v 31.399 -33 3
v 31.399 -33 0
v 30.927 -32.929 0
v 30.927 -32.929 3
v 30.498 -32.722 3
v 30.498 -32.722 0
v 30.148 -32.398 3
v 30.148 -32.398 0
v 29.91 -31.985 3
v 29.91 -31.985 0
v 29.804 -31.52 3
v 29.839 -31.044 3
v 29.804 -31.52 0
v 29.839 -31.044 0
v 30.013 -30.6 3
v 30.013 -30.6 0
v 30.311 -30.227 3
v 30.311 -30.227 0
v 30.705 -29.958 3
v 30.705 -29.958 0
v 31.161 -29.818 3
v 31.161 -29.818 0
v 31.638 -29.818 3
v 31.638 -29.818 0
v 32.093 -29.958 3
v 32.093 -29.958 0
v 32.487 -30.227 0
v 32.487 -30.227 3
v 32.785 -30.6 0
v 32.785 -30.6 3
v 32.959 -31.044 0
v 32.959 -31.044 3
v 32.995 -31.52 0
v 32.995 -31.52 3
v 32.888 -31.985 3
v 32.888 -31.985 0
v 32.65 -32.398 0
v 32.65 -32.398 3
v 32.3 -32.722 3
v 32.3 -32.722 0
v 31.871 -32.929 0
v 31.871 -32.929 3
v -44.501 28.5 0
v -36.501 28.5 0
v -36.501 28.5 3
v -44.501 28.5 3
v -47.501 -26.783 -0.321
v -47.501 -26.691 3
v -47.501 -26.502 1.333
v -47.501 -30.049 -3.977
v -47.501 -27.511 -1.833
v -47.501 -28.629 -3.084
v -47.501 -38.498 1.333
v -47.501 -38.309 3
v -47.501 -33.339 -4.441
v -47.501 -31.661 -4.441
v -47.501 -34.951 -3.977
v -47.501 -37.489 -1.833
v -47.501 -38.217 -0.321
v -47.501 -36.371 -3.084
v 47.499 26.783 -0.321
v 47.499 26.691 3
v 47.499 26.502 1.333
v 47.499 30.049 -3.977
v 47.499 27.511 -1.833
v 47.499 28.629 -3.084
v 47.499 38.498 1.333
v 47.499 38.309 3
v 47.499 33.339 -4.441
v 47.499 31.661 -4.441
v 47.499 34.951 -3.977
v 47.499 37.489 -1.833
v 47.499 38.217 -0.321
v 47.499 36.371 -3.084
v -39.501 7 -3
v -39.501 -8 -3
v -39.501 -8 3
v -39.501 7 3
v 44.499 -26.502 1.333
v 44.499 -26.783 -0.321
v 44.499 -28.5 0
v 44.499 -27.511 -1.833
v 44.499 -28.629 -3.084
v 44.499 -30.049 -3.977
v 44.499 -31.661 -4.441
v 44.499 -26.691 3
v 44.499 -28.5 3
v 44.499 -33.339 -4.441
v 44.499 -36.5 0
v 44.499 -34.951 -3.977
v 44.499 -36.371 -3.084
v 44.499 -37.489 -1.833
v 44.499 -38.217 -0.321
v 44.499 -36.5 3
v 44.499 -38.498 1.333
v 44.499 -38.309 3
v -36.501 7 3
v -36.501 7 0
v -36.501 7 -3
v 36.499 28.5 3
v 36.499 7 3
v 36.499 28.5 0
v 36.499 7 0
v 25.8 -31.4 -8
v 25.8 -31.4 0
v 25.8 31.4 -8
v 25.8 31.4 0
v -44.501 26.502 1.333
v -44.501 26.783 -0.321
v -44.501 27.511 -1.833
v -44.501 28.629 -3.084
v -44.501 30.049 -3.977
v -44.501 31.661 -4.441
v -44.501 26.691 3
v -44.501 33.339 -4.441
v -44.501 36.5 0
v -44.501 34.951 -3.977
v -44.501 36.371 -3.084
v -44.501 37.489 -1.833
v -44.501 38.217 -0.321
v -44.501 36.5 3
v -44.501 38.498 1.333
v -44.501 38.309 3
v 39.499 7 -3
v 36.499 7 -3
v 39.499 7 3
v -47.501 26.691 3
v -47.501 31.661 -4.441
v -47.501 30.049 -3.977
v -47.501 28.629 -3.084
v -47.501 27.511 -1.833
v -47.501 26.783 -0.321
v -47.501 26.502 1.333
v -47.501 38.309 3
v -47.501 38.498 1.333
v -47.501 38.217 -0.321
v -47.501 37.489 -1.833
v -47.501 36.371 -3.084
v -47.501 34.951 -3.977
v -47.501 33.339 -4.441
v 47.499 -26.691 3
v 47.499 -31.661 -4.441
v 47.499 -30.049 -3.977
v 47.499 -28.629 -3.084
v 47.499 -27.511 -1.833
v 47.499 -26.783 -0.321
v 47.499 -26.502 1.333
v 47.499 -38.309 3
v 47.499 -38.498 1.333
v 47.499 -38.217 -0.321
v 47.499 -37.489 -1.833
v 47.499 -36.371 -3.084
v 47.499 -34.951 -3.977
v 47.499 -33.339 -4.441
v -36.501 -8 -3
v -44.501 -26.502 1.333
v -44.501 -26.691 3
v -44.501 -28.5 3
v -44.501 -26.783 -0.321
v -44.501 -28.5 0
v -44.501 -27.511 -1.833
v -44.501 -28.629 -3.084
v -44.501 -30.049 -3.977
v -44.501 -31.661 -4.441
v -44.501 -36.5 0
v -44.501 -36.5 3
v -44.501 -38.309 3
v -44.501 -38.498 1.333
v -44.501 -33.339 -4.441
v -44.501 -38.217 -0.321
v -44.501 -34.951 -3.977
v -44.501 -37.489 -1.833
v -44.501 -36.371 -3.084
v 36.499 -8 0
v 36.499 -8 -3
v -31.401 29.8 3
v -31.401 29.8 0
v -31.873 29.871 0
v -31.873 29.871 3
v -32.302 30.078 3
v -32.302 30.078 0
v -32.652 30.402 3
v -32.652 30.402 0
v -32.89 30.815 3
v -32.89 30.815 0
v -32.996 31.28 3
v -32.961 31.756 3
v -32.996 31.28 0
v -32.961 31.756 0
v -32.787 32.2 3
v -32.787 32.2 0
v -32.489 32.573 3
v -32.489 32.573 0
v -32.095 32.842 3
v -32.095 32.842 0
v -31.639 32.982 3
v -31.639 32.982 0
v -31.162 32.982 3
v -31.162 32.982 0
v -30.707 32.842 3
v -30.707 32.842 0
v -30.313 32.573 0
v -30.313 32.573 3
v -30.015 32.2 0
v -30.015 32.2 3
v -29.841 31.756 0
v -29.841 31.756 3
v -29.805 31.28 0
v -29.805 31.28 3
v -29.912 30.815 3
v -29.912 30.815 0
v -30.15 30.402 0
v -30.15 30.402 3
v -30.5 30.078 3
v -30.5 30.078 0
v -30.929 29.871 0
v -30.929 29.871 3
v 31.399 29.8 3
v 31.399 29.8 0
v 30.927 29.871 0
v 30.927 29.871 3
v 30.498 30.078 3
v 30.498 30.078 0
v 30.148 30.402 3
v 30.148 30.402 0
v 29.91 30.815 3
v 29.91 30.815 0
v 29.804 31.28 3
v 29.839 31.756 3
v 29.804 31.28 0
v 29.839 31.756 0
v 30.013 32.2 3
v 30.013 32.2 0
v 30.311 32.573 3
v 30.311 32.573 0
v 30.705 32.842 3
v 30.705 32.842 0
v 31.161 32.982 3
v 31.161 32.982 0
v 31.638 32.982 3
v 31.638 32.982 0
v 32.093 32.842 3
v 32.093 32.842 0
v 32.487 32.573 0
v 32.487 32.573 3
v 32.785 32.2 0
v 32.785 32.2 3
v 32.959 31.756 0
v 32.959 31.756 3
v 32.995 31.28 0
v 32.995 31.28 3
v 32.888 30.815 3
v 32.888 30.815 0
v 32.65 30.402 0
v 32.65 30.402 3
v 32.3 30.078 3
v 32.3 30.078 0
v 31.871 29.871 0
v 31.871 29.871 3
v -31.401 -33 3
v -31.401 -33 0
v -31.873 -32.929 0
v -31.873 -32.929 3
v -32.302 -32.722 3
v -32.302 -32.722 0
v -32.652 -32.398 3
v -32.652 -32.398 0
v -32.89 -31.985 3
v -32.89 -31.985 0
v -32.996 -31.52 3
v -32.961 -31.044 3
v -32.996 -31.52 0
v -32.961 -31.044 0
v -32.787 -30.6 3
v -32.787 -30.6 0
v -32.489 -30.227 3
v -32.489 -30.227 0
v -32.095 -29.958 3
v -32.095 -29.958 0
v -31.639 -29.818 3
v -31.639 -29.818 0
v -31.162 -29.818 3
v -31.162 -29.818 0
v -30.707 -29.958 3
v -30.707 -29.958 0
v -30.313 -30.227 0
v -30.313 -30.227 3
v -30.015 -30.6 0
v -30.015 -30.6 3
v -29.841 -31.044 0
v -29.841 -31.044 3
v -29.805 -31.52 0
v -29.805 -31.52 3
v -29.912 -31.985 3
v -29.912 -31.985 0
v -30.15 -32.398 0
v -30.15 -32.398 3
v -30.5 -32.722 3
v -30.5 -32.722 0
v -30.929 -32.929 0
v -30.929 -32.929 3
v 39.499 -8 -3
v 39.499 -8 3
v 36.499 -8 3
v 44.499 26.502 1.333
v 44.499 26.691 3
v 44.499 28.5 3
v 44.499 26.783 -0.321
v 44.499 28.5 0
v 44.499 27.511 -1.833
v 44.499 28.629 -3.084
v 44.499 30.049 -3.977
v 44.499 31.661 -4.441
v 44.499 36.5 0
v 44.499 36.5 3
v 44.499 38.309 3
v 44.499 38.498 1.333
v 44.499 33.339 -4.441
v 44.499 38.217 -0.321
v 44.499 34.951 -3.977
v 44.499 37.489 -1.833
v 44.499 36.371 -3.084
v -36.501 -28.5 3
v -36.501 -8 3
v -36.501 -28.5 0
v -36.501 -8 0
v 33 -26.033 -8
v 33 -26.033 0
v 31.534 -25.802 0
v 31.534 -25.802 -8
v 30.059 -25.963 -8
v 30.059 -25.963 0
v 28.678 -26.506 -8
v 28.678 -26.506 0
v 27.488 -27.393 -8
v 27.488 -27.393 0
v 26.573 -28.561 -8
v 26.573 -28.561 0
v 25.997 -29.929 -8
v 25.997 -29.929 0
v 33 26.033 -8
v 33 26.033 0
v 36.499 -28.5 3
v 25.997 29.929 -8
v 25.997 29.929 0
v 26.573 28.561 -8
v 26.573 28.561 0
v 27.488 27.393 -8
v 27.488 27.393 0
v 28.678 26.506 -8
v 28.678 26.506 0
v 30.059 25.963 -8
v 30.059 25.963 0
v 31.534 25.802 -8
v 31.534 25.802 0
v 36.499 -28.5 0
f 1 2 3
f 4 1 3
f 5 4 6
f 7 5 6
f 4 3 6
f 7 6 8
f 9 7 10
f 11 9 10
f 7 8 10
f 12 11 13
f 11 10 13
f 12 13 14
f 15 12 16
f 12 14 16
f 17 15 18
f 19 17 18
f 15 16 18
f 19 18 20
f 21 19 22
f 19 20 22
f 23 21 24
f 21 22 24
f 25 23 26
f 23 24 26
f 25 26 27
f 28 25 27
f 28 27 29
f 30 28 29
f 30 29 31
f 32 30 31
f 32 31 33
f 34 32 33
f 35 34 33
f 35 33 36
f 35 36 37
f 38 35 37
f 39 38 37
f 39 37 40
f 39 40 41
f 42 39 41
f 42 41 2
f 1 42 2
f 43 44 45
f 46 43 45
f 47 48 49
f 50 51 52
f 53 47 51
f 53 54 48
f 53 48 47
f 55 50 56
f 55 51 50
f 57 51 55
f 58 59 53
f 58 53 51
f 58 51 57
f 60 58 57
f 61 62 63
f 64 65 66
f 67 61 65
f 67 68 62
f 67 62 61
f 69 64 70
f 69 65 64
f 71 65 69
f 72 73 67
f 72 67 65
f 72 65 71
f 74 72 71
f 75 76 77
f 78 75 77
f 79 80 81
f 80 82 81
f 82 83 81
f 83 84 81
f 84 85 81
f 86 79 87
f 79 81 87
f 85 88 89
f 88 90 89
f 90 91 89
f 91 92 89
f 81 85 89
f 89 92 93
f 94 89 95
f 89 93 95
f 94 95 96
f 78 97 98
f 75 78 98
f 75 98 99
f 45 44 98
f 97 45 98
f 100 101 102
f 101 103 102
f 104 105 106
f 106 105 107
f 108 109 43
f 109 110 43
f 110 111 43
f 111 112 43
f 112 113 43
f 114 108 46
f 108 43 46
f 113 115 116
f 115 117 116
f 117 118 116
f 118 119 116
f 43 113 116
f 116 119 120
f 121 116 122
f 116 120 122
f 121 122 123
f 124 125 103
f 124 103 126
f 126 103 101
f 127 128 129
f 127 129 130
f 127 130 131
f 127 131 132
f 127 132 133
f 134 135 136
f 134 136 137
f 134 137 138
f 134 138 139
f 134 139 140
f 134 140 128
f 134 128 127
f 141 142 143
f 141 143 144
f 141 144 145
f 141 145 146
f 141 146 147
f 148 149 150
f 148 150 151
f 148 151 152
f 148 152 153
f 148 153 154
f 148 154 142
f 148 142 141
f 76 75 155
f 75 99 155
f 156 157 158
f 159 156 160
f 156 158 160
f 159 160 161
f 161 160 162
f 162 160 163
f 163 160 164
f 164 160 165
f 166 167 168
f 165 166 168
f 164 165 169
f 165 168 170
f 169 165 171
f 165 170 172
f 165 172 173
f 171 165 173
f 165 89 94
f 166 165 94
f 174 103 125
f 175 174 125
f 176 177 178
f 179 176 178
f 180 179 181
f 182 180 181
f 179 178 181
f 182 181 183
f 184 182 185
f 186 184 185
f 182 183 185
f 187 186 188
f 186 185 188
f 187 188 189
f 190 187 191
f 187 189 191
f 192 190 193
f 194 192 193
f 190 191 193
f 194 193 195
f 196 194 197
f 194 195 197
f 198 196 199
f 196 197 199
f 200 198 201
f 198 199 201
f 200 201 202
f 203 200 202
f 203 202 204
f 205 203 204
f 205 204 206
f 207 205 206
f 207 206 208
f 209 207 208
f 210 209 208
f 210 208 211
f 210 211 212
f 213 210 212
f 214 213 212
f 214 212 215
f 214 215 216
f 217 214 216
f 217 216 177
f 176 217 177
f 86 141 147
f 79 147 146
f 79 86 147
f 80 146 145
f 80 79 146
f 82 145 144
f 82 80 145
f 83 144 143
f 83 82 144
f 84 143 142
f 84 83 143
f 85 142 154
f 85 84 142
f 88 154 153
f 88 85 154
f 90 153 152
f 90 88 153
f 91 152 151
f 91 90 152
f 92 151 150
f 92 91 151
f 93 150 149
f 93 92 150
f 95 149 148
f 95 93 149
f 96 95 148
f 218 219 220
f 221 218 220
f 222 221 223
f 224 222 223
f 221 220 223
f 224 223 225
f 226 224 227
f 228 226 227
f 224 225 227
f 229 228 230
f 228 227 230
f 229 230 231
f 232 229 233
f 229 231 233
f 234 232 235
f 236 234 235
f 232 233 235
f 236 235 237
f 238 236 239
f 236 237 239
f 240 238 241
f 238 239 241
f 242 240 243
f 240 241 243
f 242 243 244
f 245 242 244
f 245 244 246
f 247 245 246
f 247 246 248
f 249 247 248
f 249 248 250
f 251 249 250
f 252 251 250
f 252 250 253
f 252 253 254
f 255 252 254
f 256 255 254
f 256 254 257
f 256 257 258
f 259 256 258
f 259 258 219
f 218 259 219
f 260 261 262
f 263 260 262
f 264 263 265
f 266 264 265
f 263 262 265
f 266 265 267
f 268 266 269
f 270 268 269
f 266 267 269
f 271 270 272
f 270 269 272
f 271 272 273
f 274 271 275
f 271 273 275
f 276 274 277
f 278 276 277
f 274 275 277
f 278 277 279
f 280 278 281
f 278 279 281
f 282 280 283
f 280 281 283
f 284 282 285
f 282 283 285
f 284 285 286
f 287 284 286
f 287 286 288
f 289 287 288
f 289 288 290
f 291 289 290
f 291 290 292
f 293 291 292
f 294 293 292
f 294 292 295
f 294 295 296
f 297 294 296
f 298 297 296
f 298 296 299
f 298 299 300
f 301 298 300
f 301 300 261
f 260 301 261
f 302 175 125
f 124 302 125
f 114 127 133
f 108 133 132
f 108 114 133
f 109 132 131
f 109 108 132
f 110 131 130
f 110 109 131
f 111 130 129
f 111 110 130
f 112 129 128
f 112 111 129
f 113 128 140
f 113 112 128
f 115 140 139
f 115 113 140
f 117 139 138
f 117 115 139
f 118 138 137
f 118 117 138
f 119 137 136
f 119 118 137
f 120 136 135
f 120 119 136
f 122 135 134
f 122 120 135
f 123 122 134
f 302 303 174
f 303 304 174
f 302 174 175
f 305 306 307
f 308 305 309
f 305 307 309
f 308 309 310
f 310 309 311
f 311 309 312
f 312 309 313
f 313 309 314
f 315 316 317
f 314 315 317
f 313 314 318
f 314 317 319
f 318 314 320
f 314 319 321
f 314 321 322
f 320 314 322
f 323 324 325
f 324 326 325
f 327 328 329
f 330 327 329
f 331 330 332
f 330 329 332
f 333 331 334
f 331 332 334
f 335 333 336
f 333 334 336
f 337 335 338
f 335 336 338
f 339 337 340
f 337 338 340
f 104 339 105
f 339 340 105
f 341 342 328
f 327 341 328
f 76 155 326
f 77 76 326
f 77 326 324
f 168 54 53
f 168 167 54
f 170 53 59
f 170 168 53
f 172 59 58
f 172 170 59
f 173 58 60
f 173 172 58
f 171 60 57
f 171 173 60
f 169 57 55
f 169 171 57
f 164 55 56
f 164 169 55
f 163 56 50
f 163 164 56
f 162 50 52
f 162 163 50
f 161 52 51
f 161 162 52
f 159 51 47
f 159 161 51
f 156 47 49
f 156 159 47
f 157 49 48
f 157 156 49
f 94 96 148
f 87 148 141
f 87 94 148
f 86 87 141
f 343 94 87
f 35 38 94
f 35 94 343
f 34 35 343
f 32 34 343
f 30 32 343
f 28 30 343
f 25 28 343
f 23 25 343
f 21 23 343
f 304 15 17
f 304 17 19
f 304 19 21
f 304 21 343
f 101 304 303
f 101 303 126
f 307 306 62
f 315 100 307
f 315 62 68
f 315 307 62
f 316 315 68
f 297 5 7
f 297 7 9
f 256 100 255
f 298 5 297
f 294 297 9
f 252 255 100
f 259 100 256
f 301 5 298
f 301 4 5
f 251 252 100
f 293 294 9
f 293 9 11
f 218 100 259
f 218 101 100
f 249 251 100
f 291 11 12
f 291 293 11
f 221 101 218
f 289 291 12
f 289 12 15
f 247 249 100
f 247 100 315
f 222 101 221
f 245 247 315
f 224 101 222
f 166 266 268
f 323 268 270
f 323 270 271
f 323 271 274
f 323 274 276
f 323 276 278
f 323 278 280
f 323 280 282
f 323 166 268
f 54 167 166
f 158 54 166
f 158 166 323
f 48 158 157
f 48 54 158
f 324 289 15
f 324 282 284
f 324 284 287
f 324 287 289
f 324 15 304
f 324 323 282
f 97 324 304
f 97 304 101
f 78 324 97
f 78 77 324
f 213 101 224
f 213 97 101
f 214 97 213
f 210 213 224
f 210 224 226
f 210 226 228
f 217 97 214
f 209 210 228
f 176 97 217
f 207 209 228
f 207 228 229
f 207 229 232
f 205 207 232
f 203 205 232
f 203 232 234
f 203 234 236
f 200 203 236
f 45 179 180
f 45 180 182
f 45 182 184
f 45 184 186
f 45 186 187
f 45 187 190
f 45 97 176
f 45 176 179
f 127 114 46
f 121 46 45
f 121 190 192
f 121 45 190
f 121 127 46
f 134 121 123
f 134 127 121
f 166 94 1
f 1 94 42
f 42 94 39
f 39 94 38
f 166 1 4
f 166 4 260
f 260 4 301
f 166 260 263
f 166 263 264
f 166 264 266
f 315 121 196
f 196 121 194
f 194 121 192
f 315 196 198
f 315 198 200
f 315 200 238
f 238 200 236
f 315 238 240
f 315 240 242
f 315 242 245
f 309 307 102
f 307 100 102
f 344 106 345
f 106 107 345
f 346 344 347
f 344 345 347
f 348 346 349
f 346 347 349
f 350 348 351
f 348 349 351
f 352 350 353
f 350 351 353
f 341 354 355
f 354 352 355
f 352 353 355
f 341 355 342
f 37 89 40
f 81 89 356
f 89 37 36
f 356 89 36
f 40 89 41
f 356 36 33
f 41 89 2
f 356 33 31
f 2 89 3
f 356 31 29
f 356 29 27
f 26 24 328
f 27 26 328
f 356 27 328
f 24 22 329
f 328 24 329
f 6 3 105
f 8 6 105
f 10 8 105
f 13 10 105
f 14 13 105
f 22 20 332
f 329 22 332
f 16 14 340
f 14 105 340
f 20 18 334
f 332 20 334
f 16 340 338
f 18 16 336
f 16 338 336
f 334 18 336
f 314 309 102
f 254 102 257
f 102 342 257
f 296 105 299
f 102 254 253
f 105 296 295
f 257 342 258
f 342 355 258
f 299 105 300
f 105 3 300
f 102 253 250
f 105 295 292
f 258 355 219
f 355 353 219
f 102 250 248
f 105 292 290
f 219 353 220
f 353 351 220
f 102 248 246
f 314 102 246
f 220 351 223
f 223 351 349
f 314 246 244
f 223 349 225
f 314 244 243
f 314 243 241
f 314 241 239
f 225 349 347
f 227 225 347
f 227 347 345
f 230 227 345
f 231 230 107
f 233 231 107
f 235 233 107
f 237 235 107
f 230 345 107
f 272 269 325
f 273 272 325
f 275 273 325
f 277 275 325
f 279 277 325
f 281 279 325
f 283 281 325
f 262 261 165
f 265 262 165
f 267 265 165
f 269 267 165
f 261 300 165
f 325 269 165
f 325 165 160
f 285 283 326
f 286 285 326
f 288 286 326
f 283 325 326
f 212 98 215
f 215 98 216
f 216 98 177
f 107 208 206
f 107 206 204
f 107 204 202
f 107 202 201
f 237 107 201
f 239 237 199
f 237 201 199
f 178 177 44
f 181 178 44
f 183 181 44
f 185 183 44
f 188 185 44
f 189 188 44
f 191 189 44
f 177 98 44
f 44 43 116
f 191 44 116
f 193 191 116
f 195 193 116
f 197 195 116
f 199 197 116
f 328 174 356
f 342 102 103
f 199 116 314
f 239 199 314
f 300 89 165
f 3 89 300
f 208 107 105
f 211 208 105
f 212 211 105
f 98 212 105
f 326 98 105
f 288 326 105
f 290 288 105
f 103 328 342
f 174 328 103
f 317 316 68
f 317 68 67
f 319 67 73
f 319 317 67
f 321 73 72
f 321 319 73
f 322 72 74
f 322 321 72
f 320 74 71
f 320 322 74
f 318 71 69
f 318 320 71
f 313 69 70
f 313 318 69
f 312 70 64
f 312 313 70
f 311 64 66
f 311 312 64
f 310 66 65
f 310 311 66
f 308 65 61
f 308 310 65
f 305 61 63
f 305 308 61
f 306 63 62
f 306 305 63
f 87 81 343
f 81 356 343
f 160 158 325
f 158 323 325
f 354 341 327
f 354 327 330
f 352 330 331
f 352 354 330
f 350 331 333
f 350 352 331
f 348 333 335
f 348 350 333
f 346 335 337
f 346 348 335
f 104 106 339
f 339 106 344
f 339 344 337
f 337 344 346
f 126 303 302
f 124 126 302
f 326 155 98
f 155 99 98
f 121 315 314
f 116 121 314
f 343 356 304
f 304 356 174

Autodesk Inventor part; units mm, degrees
ref_plane "YZ Plane" through (0, 0, 0) normal (1, 0, 0) x (0, 1, 0)
ref_plane "XZ Plane" through (0, 0, 0) normal (0, 1, 0) x (-1, 0, 0)
sketch "Boceto1" plane through (0, 0, 0) normal (0, 0, 1) x (1, 0, 0)
  line L0 (-33.5009, -14) -> (-33.5009, 14) projected
  line L1 (-36.5009, -14) -> (-33.5009, -14) projected
  line L2 (-33.5009, 14) -> (-36.5009, 14) projected
  line L3 (-36.5009, 14) -> (-36.5009, -14) projected
  line L4 (36.4991, -36.5) -> (36.4991, 36.5) projected
  line L5 (-36.5009, -36.5) -> (36.4991, -36.5) projected
  line L6 (-36.5009, 36.5) -> (-36.5009, -36.5) projected
  line L7 (36.4991, 36.5) -> (-36.5009, 36.5) projected
  point P0 (0, 0)
extrude "Extrusión1" add sketch "Boceto1" along normal blind 3
sketch "Boceto2" plane through (0, 0, 3) normal (0, 0, 1) x (1, 0, 0)
  line L0 (36.5, 36.5) -> (-36.5, 36.5) projected
  line L1 (-36.5, 36.5) -> (-36.5, -36.5) projected
  line L2 (-36.5, -36.5) -> (36.5, -36.5) projected
  line L3 (36.5, -36.5) -> (36.5, 36.5) projected
  circle A0 centre (-31.4009, 31.4) radius 2.1 projected
  circle A1 centre (-31.4009, -31.4) radius 2.1 projected
  circle A2 centre (31.3991, -31.4) radius 2.1 projected
  circle A3 centre (31.3991, 31.4) radius 2.1 projected
  point P0 (0, 0)
hole "Agujero1" at (-31.4009, 31.4, 3) at (-31.4009, -31.4, 3) at (31.3991, -31.4, 3) at (31.3991, 31.4, 3) direction (0, 0, -1) diameter 3.2 depth 5
sketch "Boceto4" plane through (-36.5009, -36.5, 0) normal (-1, 0, 0) x (0, 0, 1)
  line L0 (0, 73) -> (0, 0) projected
  line L1 (0, 0) -> (3, 0) projected
  line L2 (3, 73) -> (3, 0) projected
  line L3 (0, 73) -> (3, 73) projected
  line L4 (3, 73) -> (0, 73)
  line L5 (0, 73) -> (0, 65)
  line L6 (0, 65) -> (3, 65)
  line L7 (3, 65) -> (3, 73)
  point P0 (0, 36.5)
  dimension "d9" = 8
extrude "Extrusión2" add sketch "Boceto4" along normal blind 8 contours L3 L2 L6 L0
sketch "Boceto5" plane through (-44.5009, -36.5, 0) normal (-1, 0, 0) x (0, 0, 1)
  line L0 (3, 65) -> (3, 73) projected
  line L1 (3, 73) -> (0, 73) projected
  line L2 (0, 73) -> (0, 65) projected
  line L3 (0, 65) -> (3, 65) projected
  line L4 (0, 73) -> (3, 65)
  circle A0 centre (1.5, 69) radius 6
  line L5 (0, 62) -> (3, 62)
  line L6 (3, 62) -> (3, 76)
  line L7 (3, 76) -> (0, 76)
  line L8 (0, 76) -> (0, 62)
  line L9 (0, 62) -> (3, 76) construction
  line L10 (3, 62) -> (0, 76) construction
  point P0 (0, 36.5)
  point P1 (3, 74.8095)
  point P2 (3, 63.1905)
  dimension "d12" = 12
extrude "Extrusión3" add sketch "Boceto5" along normal blind 3 contours L4 L1 L0 | L6 A0 L8 L3 | L3 L2 L4 | L1 L8 A0 L6 | L8 A0 L2
ref_plane "Plano de trabajo1" through (36.4991, 0, 3) normal (0, 1, 0) x (1, 0, 0)
ref_plane "Plano de trabajo2" through (-0.0009, -36.5, 0) normal (-1, 0, 0) x (0, 0, 1)
mirror "Simetría1" about plane through (36.4991, 0, 3) normal (0, 1, 0) of "Extrusión3", "Extrusión2"
mirror "Simetría2" about plane through (-0.0009, -36.5, 0) normal (-1, 0, 0) of "Extrusión3", "Extrusión2", "Simetría1"
sketch "Boceto6" plane through (36.4991, -28.5, 0) normal (1, 0, 0) x (0, 0, -1)
  line L0 (0, 14.5) -> (75, 14.5) projected
  arc A0 (75, 7) -> (78, 10) centre (75, 10) ccw projected
  line L1 (75, 7) -> (0, 7) projected
  line L2 (0, -8) -> (0, 7) projected
  line L3 (81, -8) -> (0, -8) projected
  line L4 (81, -8) -> (81, 65) projected
  line L5 (81, 65) -> (0, 65) projected
  line L6 (0, 50) -> (0, 65) projected
  line L7 (0, 50) -> (75, 50) projected
  arc A1 (75, 42.5) -> (78, 45.5) centre (75, 45.5) ccw projected
  line L8 (75, 42.5) -> (0, 42.5) projected
  line L9 (0, 14.5) -> (0, 42.5) projected
  line L10 (0, 42.5) -> (0, 14.5) projected
  line L11 (-3, 0) -> (0, 0) projected
  line L12 (0, 0) -> (0, 57) projected
  line L13 (0, 57) -> (-3, 57) projected
  line L14 (-3, 0) -> (-3, 57) projected
  line L15 (3, 35.5) -> (-3, 35.5)
  line L16 (-3, 35.5) -> (-3, 20.5)
  line L17 (-3, 20.5) -> (3, 20.5)
  line L18 (3, 20.5) -> (3, 35.5)
  line L19 (3, 35.5) -> (-3, 20.5) construction
  line L20 (-3, 35.5) -> (3, 20.5) construction
  arc A2 (78, 11.5) -> (75, 14.5) centre (75, 11.5) ccw projected
  line L21 (78, 11.5) -> (78, 10) projected
  arc A3 (78, 47) -> (75, 50) centre (75, 47) ccw projected
  line L22 (78, 47) -> (78, 45.5) projected
  point P0 (0, 28.5)
  point P1 (0, 28)
  dimension "d15" = 6
  dimension "d16" = 15
extrude "Extrusión4" add sketch "Boceto6" along normal blind 3 contours L17 L14 L15 L9 | L9 L15 L18 L17
mirror "Simetría3" about plane through (-0.0009, -36.5, 0) normal (-1, 0, 0) of "Extrusión4"
sketch "Boceto7" plane through (0, 0, 0) normal (0, 0, -1) x (-1, 0, 0)
  line L0 (-31.9991, -16) -> (-31.9991, 16) projected
  arc A0 (-24.3245, -32) -> (-31.9991, -24.3254) centre (-31.3991, -31.4) ccw projected
  arc A1 (-31.9991, 24.3254) -> (-24.3245, 32) centre (-31.3991, 31.4) ccw projected
  arc A2 (33.5009, -26.7524) -> (26.7533, -33.5) centre (31.4009, -31.4) ccw projected
  line L1 (33.5009, 17) -> (33.5009, -17) projected
  arc A3 (-26.7524, -33.5) -> (-33.5, -26.7524) centre (-31.4, -31.4) ccw
  arc A4 (-33.5, 26.7524) -> (-26.7524, 33.5) centre (-31.4, 31.4) ccw
  arc A5 (26.7524, 33.5) -> (33.5, 26.7524) centre (31.4, 31.4) ccw
  line L2 (33.5, -26.7524) -> (33.5, 26.7524)
  circle A6 centre (31.4, -31.4) radius 5.1004
  arc A7 (33.7068, -26.2968) -> (26.2977, -33.7059) centre (31.4009, -31.4) ccw
  line L3 (33, -26.7524) -> (33, 26.0334)
  arc A8 (26.2968, 33.7059) -> (33, 26.0334) centre (31.4, 31.4) ccw
  line L4 (-33.5, -26.7524) -> (-33.5, 26.7524)
  arc A9 (-33, 26.0334) -> (-26.2968, 33.7059) centre (-31.4, 31.4) ccw
  line L5 (-33, 26.0334) -> (-33, -26.0334)
  arc A10 (-26.2968, -33.7059) -> (-33, -26.0334) centre (-31.4, -31.4) ccw
  line L6 (-25.8, -42) -> (-25.8, 78)
  line L7 (25.8, -39) -> (25.8, 51)
  point P0 (0, 0)
  point P1 (-25.8, -31.4)
  point P2 (-25.8, 31.4)
  point P3 (25.8, 31.4)
  point P4 (25.8, -31.4)
  point P5 (33, -26.0331)
  dimension "d29" = 0.5
  dimension "d30" = 0.5
  dimension "d31" = 0.5
ref_plane "Plano de trabajo3" through (-33.5, 29.3, -8) normal (0, 0, -1) x (0, 1, 0)
extrude "Extrusión5" add sketch "Boceto7" along normal up to surface (8 mm away) contours A9 L6 A10 L5
properties part number "Tapa dispensador"
